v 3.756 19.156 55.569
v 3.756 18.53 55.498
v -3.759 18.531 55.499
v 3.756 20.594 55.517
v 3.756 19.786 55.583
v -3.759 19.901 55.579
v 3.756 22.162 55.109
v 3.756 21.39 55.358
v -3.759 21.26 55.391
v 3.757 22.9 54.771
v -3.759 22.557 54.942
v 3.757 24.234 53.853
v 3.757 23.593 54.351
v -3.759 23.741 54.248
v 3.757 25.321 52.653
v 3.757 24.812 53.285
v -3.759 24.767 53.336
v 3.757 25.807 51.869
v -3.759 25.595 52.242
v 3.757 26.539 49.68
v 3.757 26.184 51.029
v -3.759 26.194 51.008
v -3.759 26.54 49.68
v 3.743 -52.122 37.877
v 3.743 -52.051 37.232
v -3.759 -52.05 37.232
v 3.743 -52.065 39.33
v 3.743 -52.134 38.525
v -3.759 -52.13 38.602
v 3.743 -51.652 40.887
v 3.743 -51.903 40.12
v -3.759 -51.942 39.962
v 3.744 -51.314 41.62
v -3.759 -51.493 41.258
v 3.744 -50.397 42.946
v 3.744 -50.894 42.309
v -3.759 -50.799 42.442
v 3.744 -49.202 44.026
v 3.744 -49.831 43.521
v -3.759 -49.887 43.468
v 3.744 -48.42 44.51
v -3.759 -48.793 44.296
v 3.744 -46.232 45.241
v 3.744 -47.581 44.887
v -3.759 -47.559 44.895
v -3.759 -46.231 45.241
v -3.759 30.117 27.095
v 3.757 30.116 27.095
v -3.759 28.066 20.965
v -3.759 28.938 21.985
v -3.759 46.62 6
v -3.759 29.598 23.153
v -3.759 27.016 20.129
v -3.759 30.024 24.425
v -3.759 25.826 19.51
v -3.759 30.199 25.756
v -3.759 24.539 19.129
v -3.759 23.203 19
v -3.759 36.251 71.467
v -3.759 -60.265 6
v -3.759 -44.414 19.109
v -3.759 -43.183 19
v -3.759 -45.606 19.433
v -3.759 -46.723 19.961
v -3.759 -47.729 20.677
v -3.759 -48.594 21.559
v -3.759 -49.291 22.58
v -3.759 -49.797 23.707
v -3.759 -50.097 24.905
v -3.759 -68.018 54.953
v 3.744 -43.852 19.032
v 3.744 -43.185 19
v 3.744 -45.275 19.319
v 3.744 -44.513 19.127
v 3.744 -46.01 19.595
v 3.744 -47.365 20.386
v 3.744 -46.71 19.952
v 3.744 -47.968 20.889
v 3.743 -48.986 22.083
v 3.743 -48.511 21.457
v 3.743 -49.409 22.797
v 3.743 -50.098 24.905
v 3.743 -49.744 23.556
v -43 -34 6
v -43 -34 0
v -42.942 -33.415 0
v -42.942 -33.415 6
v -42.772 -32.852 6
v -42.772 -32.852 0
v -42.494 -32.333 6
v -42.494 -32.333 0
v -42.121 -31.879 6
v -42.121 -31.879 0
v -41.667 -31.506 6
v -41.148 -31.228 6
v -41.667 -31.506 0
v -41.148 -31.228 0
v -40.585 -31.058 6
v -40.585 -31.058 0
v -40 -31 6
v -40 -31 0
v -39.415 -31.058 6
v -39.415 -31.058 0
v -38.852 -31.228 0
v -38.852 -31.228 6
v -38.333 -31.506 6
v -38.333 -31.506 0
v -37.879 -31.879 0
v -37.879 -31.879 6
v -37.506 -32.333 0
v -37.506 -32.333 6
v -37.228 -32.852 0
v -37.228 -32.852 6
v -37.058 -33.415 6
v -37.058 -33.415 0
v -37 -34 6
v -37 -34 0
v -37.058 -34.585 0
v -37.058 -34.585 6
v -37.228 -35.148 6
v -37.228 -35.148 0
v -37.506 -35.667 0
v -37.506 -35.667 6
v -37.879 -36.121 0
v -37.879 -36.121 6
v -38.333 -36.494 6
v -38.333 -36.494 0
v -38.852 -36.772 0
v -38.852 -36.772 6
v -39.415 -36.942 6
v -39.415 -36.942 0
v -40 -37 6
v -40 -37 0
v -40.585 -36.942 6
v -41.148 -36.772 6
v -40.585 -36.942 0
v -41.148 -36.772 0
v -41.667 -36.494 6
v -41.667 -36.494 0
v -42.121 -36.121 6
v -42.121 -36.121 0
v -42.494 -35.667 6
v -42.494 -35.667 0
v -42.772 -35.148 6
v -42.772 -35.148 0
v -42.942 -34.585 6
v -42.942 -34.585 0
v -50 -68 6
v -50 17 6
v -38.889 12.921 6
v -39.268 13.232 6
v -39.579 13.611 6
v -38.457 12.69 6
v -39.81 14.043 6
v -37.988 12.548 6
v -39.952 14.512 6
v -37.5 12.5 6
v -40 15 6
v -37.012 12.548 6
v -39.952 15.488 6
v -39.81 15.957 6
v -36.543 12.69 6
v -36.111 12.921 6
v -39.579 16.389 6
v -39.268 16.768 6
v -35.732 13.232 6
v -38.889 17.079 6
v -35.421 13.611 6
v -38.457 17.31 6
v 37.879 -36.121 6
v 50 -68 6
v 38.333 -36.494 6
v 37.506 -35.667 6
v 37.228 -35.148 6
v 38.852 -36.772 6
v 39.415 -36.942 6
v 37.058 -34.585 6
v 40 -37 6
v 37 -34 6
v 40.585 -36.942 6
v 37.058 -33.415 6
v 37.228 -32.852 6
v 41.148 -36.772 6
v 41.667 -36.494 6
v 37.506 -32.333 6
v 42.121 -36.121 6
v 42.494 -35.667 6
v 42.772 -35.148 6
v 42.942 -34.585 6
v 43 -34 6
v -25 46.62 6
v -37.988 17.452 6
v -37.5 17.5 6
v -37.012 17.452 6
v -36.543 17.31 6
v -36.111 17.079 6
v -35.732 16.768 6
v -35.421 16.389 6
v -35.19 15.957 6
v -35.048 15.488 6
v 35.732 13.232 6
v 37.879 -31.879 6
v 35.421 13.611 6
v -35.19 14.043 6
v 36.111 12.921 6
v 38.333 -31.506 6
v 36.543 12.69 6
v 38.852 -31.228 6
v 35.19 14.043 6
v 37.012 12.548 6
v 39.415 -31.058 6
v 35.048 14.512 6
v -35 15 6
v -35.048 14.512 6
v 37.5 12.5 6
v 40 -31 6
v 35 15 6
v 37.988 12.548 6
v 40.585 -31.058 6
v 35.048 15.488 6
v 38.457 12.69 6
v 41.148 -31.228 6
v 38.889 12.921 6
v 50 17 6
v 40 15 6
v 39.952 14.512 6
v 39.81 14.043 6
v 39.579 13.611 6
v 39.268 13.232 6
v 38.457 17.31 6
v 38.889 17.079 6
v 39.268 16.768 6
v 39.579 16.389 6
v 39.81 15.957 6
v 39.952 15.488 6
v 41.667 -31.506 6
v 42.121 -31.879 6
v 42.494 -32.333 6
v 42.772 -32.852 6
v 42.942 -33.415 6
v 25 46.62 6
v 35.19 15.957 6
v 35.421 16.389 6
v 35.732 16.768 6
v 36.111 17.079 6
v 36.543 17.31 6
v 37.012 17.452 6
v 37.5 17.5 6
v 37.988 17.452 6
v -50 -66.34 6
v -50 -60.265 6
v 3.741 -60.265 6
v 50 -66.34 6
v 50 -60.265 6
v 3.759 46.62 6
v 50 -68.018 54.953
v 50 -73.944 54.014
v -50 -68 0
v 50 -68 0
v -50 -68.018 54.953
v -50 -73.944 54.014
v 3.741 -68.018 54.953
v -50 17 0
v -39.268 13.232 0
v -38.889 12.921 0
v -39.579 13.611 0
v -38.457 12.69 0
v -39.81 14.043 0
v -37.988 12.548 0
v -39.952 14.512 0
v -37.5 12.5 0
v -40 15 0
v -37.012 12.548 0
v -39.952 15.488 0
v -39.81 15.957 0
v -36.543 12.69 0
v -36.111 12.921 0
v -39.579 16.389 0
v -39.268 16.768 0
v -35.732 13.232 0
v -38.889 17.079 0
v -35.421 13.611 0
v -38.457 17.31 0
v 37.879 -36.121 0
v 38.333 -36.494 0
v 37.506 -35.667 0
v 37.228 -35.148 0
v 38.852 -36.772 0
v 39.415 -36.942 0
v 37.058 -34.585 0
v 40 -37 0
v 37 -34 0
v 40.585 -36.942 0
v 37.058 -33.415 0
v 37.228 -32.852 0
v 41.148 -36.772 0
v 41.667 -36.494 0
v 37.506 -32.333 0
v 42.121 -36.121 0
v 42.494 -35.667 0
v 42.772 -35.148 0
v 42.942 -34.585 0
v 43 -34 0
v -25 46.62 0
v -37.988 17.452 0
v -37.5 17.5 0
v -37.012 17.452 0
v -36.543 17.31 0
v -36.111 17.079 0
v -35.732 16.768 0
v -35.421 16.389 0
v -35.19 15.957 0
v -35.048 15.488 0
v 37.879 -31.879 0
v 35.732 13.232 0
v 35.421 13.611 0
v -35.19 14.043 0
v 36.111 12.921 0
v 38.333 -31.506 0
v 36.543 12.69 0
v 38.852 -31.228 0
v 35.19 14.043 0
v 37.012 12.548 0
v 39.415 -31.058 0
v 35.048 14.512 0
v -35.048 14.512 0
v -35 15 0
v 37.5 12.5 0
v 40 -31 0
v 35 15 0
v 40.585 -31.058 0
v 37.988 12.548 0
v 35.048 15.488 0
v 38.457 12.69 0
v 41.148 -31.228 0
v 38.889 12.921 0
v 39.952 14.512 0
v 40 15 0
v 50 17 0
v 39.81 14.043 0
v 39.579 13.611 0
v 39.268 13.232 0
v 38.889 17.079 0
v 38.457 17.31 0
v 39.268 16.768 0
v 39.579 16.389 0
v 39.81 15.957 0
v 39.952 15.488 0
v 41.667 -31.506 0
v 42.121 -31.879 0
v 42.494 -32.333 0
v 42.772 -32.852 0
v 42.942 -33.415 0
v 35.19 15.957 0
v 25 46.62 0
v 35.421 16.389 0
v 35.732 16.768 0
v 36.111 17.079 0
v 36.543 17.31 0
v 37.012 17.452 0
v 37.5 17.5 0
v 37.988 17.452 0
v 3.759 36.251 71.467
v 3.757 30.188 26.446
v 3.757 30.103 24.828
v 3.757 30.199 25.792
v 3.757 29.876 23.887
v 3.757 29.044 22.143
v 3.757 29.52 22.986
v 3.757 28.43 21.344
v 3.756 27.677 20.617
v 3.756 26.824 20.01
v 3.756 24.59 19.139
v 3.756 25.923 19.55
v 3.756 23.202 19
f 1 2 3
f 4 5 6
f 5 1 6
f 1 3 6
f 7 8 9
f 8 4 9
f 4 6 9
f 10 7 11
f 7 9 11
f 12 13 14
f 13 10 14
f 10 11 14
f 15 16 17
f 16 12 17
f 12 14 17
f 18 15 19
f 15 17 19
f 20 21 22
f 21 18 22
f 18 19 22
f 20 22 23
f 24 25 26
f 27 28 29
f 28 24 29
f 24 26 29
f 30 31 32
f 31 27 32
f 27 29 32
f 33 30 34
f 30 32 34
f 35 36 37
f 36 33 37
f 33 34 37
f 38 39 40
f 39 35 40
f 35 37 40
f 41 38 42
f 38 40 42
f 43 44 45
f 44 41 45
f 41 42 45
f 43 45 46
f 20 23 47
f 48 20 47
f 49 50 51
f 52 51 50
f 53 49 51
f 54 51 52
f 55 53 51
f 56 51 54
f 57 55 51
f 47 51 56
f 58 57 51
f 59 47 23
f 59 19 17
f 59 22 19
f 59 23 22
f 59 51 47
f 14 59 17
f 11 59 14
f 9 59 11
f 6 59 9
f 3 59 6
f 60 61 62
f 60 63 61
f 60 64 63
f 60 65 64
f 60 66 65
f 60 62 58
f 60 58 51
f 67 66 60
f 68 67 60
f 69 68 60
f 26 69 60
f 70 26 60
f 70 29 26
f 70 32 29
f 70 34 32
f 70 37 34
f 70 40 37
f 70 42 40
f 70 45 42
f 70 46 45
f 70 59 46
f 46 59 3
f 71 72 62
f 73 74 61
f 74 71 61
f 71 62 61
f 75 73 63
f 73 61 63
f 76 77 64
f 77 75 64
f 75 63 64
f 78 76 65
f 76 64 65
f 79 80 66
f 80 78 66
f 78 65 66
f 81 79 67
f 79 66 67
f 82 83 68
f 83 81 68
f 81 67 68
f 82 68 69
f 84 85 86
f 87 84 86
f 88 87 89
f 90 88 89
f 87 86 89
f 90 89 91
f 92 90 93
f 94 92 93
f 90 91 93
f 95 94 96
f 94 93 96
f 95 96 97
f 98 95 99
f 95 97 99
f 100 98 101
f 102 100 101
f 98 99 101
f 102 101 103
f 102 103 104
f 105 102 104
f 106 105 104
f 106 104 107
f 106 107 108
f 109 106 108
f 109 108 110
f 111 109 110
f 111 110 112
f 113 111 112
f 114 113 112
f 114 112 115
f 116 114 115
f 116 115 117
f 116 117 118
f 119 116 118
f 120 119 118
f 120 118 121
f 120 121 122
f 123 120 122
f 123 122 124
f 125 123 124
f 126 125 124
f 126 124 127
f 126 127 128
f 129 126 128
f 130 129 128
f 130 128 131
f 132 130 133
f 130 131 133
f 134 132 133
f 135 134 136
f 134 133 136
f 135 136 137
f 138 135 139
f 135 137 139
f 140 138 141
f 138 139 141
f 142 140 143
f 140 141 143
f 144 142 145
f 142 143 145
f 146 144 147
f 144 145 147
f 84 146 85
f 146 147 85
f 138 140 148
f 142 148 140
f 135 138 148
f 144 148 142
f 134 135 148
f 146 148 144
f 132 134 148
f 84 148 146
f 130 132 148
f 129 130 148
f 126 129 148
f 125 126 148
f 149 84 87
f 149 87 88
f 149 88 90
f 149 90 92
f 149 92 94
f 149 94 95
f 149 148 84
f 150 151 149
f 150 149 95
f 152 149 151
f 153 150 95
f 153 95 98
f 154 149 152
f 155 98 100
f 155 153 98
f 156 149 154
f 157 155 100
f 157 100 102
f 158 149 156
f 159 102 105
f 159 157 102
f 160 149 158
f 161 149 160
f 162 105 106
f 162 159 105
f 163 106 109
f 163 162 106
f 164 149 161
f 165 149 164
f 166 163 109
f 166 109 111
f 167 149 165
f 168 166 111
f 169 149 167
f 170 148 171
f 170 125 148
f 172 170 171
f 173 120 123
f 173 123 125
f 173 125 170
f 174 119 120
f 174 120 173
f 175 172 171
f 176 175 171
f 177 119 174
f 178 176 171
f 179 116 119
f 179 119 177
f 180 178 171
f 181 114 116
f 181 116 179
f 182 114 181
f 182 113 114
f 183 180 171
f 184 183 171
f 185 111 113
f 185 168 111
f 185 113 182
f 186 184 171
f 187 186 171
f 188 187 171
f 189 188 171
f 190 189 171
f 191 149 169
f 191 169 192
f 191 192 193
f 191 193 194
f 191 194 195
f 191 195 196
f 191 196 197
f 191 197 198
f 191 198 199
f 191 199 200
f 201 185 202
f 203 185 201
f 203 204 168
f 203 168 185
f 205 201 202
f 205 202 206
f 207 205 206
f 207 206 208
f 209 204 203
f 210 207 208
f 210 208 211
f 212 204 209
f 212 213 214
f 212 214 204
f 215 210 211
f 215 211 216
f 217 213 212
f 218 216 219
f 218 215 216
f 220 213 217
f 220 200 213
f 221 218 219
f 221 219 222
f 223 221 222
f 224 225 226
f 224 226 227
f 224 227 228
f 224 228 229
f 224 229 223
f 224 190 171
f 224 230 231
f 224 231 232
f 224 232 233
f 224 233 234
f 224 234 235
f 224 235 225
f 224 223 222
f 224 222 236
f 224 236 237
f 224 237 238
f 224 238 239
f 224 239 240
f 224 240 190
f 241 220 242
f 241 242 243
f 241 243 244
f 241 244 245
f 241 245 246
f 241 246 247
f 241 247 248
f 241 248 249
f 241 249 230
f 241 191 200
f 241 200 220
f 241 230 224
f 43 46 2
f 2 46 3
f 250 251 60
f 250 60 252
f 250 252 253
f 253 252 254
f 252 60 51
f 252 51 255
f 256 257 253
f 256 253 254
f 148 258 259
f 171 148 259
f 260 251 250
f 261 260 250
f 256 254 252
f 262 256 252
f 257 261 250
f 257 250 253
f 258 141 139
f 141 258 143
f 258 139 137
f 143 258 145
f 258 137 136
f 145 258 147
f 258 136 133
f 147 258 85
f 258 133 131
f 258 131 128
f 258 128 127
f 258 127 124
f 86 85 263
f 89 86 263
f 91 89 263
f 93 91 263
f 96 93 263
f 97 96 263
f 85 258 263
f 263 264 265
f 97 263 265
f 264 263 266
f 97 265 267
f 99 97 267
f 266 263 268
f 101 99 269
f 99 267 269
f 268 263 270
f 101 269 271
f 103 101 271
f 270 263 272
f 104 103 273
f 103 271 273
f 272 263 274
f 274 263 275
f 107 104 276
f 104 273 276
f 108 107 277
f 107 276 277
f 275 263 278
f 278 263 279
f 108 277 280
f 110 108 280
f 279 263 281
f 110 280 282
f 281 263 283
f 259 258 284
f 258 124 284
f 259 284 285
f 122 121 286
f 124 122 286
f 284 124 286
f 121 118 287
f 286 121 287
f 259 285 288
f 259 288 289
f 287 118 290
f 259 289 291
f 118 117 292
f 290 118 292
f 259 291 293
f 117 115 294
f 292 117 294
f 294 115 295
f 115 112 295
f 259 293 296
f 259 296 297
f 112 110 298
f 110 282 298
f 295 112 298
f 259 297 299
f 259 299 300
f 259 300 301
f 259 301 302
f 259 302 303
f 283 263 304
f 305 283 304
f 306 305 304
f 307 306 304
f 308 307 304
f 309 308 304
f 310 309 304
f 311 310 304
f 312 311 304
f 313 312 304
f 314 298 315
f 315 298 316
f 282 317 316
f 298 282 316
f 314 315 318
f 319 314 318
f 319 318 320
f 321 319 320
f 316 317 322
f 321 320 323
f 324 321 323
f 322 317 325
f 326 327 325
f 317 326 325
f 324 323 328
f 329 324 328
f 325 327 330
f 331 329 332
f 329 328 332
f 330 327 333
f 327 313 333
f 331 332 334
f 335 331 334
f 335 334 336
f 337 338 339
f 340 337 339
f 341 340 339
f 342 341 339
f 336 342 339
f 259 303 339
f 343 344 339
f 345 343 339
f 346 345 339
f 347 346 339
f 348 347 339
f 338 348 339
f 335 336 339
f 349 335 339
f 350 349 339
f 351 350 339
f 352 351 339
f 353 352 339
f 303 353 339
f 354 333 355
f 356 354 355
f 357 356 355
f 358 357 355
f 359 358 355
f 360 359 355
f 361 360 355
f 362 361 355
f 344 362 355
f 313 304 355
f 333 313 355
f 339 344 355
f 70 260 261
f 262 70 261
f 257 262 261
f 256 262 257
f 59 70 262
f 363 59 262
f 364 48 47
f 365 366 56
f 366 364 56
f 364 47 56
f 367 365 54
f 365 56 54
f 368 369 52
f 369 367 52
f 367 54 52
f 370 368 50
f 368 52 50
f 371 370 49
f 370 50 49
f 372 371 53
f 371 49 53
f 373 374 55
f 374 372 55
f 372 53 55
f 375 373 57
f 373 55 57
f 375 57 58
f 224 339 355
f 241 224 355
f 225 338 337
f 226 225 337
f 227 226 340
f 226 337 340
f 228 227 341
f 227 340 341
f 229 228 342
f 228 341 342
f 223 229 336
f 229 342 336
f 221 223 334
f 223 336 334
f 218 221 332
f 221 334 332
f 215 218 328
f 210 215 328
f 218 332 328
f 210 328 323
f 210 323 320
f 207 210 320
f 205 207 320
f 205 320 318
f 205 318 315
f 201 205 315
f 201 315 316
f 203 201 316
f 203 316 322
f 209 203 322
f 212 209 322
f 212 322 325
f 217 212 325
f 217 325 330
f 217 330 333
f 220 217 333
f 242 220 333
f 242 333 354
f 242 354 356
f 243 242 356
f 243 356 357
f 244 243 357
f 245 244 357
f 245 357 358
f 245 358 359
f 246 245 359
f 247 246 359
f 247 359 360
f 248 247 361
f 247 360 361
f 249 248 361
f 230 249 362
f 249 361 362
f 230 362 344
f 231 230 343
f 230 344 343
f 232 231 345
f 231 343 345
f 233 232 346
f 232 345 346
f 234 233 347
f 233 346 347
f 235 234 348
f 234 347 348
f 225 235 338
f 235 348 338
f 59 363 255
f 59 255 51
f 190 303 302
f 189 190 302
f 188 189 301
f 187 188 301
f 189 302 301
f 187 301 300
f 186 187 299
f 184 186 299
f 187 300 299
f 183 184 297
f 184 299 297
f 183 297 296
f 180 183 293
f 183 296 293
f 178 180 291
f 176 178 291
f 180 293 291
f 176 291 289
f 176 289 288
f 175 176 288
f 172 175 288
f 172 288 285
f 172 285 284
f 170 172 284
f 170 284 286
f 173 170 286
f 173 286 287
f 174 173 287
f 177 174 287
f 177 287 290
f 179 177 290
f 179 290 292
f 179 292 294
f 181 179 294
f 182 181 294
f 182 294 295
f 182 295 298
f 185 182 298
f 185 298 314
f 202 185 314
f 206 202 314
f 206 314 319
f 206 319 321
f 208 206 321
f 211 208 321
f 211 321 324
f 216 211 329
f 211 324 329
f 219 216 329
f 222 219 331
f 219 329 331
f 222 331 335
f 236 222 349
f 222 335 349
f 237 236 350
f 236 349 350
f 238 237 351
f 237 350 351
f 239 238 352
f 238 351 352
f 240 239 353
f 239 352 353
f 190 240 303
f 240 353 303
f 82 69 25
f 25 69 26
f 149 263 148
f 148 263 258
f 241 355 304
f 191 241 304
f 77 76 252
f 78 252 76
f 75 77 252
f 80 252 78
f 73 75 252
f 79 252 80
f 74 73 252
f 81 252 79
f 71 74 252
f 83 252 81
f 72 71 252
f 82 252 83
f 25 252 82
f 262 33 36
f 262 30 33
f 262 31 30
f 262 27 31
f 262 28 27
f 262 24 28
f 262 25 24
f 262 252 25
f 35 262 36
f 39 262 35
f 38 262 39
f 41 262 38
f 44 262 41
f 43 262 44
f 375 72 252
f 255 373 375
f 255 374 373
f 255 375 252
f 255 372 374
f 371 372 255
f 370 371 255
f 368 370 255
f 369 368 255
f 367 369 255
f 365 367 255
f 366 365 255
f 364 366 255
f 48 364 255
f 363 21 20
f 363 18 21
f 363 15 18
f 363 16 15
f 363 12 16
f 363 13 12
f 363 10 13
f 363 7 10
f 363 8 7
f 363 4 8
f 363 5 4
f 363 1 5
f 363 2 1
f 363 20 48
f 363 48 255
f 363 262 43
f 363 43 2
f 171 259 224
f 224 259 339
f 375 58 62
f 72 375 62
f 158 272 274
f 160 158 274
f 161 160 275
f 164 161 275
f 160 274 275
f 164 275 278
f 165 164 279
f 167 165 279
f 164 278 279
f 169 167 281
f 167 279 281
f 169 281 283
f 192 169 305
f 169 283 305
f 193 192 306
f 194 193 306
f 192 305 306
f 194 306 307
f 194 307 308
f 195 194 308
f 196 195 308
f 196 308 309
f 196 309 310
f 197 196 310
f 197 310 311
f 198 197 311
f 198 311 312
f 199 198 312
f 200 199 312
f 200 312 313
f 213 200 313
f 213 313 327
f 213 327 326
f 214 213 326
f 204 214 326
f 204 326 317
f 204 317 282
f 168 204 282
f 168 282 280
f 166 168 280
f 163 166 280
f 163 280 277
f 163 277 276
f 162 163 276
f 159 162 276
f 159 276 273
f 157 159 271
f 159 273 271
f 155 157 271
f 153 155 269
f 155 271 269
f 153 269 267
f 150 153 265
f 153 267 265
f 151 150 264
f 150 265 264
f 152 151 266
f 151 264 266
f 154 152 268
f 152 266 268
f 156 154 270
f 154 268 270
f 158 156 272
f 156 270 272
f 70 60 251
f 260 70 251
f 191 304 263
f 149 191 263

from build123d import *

# Parameters (mm, degrees)
BOSS_EXTRUDE1_DEPTH = 6
BOSS_EXTRUDE3_REACH = 101.785
CUT_EXTRUDE1_DEPTH  = 7.516274167
SKETCH4_R           = 2.5
SKETCH4_R_2         = 3
CUT_EXTRUDE2_DEPTH  = 10


with BuildPart() as part:
    # Sketch1 → Boss-Extrude1 (new body)
    with BuildSketch(Plane.XY):
        Polygon((-50, -68), (50, -68), (50, 17), (25, 46.620442646), (-25, 46.620442646), (-50, 17), align=None)
    extrude(amount=BOSS_EXTRUDE1_DEPTH)

    # Sketch4 → Cut-Extrude2 (cut)
    with BuildSketch(Plane(origin=(0, 0, 0), x_dir=(-1, 0, 0), z_dir=(0, 0, -1))):
        with Locations((37.5, 15)):
            Circle(SKETCH4_R)
        with Locations((40, -34)):
            Circle(SKETCH4_R_2)
        with Locations(Location((-37.5, 15, 0), (0, 0, 180))):
            Circle(SKETCH4_R)
        with Locations(Location((-40, -34, 0), (0, 0, 180))):
            Circle(SKETCH4_R_2)
    extrude(amount=-CUT_EXTRUDE2_DEPTH, mode=Mode.SUBTRACT)


with BuildPart() as body_2:
    # Boss-Extrude3: up to this plane
    boss_extrude3_end = Plane(origin=(0, 0, 6), z_dir=(0, 0, 1))
    # Sketch2 → Boss-Extrude3 (new, up to the surface)
    with BuildSketch(Plane(origin=(0, -10.155161239, 64.117164656), x_dir=(-1, 0, 0), z_dir=(0, 0.15643446504022426, -0.9876883405951389)), mode=Mode.PRIVATE) as boss_extrude3_sk1:
        Polygon((50, -64.584267711), (-50, -64.584267711), (-50, -58.584267711), (-3.741030689, -58.584267711), (-3.759259362, 46.984422973), (3.759259418, 46.985074426), (3.759259418, -58.584267711), (50, -58.584267711), align=None)
    boss_extrude3_tool1 = split(extrude(boss_extrude3_sk1.sketch, amount=BOSS_EXTRUDE3_REACH, mode=Mode.PRIVATE), bisect_by=boss_extrude3_end, keep=Keep.BOTH, mode=Mode.PRIVATE)
    add(boss_extrude3_tool1.solids().sort_by_distance((-0.002595, -39.607556, 59.452364))[0])

    # Sketch3 → Cut-Extrude1 (cut, along a direction that is not the sketch's normal)
    with BuildSketch(Plane.ZY.offset(3.759259418)):
        with BuildLine():
            Line((49.679834781, 26.540189826), (27.095041255, 30.117269708))
            ThreePointArc((27.095041255, 30.117269708), (21.453863662, 28.526293083), (19, 23.203451324))
            Line((19, 23.203451324), (19, -43.18322091))
            ThreePointArc((19, -43.18322091), (20.677158241, -47.729357249), (24.904958745, -50.097039294))
            Line((24.904958745, -50.097039294), (37.23244731, -52.049521672))
            ThreePointArc((37.23244731, -52.049521672), (42.441985332, -50.798822248), (45.24130695, -46.230744543))
            Line((45.24130695, -46.230744543), (55.49861191, 18.531330187))
            ThreePointArc((55.49861191, 18.531330187), (54.247912486, 23.740868208), (49.679834781, 26.540189826))
        make_face()
    extrude(amount=-CUT_EXTRUDE1_DEPTH, dir=(-0.9999999850923287, 0.00017054532892280964, 2.701172647133097e-05), mode=Mode.SUBTRACT)


solid = Compound([part.part, body_2.part])
